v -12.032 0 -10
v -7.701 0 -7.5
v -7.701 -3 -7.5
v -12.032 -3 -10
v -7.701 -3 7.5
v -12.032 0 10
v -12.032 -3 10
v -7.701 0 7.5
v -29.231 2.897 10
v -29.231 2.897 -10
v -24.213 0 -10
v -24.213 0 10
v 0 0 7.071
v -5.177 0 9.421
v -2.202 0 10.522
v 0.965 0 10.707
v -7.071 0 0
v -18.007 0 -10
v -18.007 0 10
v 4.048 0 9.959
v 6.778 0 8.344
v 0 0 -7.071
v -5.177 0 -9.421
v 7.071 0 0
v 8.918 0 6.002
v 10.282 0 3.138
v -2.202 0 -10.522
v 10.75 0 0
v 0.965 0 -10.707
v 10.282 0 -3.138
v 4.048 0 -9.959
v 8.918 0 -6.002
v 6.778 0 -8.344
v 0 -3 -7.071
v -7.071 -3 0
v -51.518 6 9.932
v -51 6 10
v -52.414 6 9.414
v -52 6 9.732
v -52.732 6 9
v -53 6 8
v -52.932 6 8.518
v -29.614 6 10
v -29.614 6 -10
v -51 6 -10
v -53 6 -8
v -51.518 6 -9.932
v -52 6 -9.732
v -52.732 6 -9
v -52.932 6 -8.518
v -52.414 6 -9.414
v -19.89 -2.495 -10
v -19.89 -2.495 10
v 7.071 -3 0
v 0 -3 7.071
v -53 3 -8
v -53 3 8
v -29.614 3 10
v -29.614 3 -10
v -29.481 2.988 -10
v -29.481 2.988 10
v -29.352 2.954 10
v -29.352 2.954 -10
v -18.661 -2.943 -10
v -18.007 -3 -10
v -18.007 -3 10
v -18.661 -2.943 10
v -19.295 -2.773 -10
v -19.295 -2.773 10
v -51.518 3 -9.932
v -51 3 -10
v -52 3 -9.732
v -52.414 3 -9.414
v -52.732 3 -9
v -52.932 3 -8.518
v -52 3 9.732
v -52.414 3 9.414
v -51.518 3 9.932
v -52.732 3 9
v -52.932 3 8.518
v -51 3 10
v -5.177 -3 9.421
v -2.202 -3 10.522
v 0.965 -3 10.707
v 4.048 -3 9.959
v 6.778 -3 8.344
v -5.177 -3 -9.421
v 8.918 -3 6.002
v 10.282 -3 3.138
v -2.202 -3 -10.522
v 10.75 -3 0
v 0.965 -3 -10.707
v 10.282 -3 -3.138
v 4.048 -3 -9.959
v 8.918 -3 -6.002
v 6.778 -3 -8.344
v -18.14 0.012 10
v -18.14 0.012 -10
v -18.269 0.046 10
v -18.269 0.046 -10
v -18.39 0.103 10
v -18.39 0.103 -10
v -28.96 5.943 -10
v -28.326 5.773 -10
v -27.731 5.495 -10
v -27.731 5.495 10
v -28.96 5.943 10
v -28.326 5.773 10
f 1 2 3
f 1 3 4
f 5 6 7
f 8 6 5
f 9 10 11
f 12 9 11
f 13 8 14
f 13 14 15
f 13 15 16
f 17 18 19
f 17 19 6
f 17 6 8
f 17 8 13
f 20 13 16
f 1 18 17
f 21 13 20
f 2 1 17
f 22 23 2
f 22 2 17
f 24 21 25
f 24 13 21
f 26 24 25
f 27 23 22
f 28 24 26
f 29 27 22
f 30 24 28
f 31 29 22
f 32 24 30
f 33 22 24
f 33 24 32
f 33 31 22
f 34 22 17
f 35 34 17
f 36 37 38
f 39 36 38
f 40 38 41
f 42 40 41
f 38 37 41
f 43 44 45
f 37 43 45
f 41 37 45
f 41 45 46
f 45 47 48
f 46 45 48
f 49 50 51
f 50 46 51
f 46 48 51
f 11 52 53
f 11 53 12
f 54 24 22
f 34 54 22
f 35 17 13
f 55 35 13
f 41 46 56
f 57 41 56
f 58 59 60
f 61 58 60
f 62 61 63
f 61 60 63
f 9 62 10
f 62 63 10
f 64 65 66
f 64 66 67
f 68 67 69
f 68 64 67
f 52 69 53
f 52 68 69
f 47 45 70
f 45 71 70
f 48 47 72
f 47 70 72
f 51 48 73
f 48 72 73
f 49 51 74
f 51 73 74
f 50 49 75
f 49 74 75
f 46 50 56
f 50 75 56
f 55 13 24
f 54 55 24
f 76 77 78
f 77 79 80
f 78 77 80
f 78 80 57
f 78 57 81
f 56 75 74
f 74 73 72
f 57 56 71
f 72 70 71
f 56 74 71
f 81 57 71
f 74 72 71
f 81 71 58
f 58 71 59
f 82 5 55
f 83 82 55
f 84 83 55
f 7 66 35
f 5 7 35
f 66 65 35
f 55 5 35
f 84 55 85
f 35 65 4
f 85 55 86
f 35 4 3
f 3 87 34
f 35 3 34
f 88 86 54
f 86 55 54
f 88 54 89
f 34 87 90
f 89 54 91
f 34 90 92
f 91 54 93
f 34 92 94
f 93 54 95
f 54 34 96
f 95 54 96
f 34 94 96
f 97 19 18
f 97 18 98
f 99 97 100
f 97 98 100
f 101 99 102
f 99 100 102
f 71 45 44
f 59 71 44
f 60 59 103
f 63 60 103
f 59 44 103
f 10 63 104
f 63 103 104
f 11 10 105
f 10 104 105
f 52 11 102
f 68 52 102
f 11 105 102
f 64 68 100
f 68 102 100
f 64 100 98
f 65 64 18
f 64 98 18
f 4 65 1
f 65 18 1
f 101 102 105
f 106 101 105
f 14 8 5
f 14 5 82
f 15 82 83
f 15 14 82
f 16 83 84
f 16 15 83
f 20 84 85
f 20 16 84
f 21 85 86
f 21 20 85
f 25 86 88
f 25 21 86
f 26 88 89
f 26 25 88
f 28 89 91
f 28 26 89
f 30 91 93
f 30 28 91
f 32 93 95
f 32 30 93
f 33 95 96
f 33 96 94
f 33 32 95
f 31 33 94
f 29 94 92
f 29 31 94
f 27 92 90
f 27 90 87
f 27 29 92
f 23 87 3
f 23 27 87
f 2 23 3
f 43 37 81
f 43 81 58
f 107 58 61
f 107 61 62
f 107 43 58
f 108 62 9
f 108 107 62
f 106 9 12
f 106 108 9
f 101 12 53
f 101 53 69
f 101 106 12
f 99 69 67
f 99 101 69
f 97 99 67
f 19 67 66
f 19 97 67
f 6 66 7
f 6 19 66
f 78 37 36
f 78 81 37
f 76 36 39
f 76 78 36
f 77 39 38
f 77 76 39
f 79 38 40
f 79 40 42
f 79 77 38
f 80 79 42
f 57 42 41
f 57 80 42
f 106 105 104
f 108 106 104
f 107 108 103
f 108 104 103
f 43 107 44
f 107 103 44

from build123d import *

# Parameters (mm, degrees)
SM_BASE_FLANGE_1_DEPTH = 3
OTHER_START            = -10
OTHER_1_DEPTH          = 20
OTHER_1_2_DEPTH        = 20
CUT_EXTRUDE_1_DEPTH    = 55.411051267
FILLET_1_R             = 2


# Read off the part's stored shape, not the designer's step: 转折1
# Sheet-metal steps are written as plain solids
with BuildPart() as part:
    # Sketch 2 → 基体-法兰1 (new body)
    with BuildSketch(Plane(origin=(0, 0, 0), x_dir=(1, 0, 0), z_dir=(0, 1, 0))):
        with BuildLine():
            Line((-12.031587919, -10), (-7.7014609, -7.5))
            ThreePointArc((-7.7014609, -7.5), (10.75, 0), (-7.7014609, 7.5))
            Line((-7.7014609, 7.5), (-12.031587919, 10))
            Line((-12.031587919, 10), (-53, 10))
            Line((-53, 10), (-53, -10))
            Line((-53, -10), (-12.031587919, -10))
        make_face()
    extrude(amount=-SM_BASE_FLANGE_1_DEPTH)

    # Other 1 outline → Other 1 (cut)
    with BuildSketch(Plane.XY.offset(OTHER_START)):
        with BuildLine():
            ThreePointArc((-18.007123317, -3), (-18.981991132, -2.871656217), (-19.890423317, -2.495371286))
            Line((-19.890423317, -2.495371286), (-24.212533168, 0))
            Line((-24.212533168, 0), (-53, 0))
            Line((-53, 0), (-53, -3))
            Line((-53, -3), (-18.007123317, -3))
        make_face()
    extrude(amount=OTHER_1_DEPTH, mode=Mode.SUBTRACT)

    # Other 1 2 outline → Other 1 2 (add)
    with BuildSketch(Plane.XY.offset(OTHER_START)):
        with BuildLine():
            Line((-29.230795442, 2.897295075), (-24.212533168, 0))
            Line((-24.212533168, 0), (-18.007123317, 0))
            ThreePointArc((-18.007123317, 0), (-18.205533997, 0.026121262), (-18.390423317, 0.102704925))
            Line((-18.390423317, 0.102704925), (-27.730795442, 5.495371286))
            ThreePointArc((-27.730795442, 5.495371286), (-28.639227627, 5.871656217), (-29.614095442, 6))
            Line((-29.614095442, 6), (-53, 6))
            Line((-53, 6), (-53, 3))
            Line((-53, 3), (-29.614095442, 3))
            ThreePointArc((-29.614095442, 3), (-29.415684762, 2.973878738), (-29.230795442, 2.897295075))
        make_face()
    extrude(amount=OTHER_1_2_DEPTH)

    # 草图8 → 切除-拉伸1 (cut, through all)
    with BuildSketch(Plane(origin=(0, 0, 0), x_dir=(1, 0, 0), z_dir=(0, 1, 0))):
        Polygon((0, 7.071067812), (-7.071067812, 0), (0, -7.071067812), (7.071067812, 0), align=None)
    extrude(amount=-CUT_EXTRUDE_1_DEPTH, mode=Mode.SUBTRACT)

    # 圆角1
    fillet_1_edges = [part.edges().sort_by_distance(p)[0] for p in [
        (-53, 4.5, 10),
        (-53, 4.5, -10),
    ]]
    fillet(fillet_1_edges, radius=FILLET_1_R)


solid = part.part
